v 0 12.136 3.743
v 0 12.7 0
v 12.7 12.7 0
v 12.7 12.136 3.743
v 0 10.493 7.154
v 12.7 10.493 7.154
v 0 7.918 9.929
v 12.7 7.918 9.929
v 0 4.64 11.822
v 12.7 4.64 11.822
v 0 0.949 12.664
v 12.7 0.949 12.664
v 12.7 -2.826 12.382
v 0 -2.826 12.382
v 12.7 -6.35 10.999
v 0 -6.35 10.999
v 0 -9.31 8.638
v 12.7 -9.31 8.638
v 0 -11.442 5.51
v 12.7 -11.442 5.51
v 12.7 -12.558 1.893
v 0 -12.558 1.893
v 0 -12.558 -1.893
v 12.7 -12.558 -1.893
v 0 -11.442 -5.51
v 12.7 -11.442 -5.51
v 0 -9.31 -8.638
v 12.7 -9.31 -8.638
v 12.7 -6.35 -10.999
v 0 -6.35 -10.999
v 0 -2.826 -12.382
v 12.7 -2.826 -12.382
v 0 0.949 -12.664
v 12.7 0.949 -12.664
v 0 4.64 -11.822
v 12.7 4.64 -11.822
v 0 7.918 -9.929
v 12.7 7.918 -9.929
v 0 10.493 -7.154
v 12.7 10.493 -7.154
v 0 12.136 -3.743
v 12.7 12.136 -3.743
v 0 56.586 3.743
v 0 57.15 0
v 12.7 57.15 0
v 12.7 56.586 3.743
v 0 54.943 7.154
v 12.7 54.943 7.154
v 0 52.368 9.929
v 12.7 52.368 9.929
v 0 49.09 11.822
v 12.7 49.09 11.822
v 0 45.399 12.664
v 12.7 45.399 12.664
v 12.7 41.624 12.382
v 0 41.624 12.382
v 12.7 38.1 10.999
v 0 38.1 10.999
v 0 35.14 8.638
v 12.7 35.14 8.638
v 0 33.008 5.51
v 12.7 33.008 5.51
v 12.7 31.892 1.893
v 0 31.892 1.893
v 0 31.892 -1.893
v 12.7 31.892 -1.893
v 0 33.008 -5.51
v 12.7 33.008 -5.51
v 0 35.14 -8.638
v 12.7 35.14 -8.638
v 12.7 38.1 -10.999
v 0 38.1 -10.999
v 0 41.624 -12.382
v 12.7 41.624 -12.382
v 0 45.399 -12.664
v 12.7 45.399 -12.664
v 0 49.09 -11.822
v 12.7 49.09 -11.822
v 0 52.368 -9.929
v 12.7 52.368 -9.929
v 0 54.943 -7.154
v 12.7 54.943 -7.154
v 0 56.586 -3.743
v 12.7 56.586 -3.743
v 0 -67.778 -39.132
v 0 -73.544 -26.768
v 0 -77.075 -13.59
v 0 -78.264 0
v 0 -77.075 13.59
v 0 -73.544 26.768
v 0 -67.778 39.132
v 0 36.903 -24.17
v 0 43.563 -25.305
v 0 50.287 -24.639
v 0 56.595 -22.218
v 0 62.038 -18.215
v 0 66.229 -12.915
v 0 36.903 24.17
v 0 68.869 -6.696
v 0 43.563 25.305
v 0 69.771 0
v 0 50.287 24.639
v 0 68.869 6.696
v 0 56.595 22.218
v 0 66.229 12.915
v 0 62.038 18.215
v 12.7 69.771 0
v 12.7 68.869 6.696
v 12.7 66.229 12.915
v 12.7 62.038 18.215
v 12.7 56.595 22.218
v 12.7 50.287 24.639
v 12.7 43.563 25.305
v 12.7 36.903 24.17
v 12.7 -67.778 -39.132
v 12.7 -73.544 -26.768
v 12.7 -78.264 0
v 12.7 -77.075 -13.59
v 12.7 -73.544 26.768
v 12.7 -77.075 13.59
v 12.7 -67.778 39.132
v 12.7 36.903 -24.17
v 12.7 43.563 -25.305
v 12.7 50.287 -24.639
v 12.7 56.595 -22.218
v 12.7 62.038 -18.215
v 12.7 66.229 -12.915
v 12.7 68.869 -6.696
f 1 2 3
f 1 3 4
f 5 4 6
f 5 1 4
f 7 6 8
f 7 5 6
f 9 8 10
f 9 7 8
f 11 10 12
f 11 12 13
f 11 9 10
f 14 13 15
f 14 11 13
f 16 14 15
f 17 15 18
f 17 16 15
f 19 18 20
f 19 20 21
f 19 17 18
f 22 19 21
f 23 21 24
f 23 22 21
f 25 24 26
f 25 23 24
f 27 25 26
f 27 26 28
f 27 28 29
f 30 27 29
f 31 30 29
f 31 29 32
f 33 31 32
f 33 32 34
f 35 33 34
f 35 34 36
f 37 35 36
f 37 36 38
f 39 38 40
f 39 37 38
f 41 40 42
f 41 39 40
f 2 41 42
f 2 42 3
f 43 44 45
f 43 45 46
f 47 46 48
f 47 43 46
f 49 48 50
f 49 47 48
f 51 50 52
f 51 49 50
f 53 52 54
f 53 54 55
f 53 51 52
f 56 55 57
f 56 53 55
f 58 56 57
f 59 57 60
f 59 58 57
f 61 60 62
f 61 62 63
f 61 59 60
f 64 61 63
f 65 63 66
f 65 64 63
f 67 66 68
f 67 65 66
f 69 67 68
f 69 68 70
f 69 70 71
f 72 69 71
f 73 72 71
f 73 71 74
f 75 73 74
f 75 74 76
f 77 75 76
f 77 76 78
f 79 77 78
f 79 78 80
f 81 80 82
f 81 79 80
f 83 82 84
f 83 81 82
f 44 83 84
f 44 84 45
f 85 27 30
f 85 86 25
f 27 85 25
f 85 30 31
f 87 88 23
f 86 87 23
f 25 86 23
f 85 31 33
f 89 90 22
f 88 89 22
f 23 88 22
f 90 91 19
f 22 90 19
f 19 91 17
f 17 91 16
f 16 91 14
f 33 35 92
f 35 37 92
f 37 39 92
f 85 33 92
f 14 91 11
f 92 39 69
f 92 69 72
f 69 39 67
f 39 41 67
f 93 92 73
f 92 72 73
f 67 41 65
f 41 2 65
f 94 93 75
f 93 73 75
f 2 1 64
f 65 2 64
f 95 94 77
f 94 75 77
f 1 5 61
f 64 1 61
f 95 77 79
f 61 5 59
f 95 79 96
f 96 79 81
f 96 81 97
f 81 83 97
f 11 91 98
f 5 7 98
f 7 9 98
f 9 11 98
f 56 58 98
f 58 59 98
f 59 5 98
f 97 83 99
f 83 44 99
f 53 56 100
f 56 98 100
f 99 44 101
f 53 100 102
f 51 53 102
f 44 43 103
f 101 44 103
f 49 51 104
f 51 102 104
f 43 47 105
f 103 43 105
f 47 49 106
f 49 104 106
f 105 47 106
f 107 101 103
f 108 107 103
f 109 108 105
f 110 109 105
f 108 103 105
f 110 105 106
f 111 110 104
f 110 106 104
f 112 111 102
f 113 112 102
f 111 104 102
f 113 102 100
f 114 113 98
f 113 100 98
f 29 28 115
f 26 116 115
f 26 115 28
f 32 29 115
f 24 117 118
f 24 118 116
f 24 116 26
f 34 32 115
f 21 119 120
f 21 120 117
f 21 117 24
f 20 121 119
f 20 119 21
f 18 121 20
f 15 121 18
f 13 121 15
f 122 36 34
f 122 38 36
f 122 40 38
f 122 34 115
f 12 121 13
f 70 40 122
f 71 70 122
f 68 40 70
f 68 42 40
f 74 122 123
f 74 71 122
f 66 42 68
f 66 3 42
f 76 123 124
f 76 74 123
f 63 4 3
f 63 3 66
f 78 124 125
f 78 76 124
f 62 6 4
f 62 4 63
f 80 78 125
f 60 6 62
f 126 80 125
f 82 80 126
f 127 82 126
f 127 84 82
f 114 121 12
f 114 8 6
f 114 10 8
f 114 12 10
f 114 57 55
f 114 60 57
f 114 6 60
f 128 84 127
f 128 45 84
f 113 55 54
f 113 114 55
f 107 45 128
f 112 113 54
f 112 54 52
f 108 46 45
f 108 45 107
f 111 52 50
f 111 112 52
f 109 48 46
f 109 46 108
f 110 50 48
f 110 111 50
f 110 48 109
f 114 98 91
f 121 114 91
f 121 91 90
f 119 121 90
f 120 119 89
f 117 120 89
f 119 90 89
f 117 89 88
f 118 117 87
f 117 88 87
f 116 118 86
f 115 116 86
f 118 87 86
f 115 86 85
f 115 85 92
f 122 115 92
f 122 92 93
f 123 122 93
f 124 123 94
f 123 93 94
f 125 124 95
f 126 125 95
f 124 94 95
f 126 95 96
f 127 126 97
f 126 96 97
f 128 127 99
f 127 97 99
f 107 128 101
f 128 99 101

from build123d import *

# Parameters (mm, degrees)
F0_R     = 12.7
F1_DEPTH = 12.7


# Not quite as in the source:
# - a length typed as a fraction of an inch, garbled in the dataset ("3 / 203.2 mm" for 3/8 in), is restored


with BuildPart() as f1:
    # F0 (on Right) → F1 (new body)
    with BuildSketch(Plane.YZ):
        with BuildLine():
            ThreePointArc((36.9027980984, -24.1696875), (19.129375, 0), (36.9027980984, 24.1696875))
            Line((36.9027980984, 24.1696875), (-67.7783956954, 39.131875))
            ThreePointArc((-67.7783956954, 39.131875), (-78.26375, 0), (-67.7783956954, -39.131875))
            Line((-67.7783956954, -39.131875), (36.9027980984, -24.1696875))
        make_face()
        Circle(F0_R, mode=Mode.SUBTRACT)
        with BuildLine():
            ThreePointArc((36.9027980984, -24.1696875), (59.4505696765, -20.3989450651), (69.770625, 0))
            ThreePointArc((69.770625, 0), (59.4505696765, 20.3989450651), (36.9027980984, 24.1696875))
            ThreePointArc((36.9027980984, 24.1696875), (19.129375, 0), (36.9027980984, -24.1696875))
        make_face()
        with Locations((44.45, 0)):
            Circle(F0_R, mode=Mode.SUBTRACT)
    extrude(amount=F1_DEPTH)


solid = f1.part
